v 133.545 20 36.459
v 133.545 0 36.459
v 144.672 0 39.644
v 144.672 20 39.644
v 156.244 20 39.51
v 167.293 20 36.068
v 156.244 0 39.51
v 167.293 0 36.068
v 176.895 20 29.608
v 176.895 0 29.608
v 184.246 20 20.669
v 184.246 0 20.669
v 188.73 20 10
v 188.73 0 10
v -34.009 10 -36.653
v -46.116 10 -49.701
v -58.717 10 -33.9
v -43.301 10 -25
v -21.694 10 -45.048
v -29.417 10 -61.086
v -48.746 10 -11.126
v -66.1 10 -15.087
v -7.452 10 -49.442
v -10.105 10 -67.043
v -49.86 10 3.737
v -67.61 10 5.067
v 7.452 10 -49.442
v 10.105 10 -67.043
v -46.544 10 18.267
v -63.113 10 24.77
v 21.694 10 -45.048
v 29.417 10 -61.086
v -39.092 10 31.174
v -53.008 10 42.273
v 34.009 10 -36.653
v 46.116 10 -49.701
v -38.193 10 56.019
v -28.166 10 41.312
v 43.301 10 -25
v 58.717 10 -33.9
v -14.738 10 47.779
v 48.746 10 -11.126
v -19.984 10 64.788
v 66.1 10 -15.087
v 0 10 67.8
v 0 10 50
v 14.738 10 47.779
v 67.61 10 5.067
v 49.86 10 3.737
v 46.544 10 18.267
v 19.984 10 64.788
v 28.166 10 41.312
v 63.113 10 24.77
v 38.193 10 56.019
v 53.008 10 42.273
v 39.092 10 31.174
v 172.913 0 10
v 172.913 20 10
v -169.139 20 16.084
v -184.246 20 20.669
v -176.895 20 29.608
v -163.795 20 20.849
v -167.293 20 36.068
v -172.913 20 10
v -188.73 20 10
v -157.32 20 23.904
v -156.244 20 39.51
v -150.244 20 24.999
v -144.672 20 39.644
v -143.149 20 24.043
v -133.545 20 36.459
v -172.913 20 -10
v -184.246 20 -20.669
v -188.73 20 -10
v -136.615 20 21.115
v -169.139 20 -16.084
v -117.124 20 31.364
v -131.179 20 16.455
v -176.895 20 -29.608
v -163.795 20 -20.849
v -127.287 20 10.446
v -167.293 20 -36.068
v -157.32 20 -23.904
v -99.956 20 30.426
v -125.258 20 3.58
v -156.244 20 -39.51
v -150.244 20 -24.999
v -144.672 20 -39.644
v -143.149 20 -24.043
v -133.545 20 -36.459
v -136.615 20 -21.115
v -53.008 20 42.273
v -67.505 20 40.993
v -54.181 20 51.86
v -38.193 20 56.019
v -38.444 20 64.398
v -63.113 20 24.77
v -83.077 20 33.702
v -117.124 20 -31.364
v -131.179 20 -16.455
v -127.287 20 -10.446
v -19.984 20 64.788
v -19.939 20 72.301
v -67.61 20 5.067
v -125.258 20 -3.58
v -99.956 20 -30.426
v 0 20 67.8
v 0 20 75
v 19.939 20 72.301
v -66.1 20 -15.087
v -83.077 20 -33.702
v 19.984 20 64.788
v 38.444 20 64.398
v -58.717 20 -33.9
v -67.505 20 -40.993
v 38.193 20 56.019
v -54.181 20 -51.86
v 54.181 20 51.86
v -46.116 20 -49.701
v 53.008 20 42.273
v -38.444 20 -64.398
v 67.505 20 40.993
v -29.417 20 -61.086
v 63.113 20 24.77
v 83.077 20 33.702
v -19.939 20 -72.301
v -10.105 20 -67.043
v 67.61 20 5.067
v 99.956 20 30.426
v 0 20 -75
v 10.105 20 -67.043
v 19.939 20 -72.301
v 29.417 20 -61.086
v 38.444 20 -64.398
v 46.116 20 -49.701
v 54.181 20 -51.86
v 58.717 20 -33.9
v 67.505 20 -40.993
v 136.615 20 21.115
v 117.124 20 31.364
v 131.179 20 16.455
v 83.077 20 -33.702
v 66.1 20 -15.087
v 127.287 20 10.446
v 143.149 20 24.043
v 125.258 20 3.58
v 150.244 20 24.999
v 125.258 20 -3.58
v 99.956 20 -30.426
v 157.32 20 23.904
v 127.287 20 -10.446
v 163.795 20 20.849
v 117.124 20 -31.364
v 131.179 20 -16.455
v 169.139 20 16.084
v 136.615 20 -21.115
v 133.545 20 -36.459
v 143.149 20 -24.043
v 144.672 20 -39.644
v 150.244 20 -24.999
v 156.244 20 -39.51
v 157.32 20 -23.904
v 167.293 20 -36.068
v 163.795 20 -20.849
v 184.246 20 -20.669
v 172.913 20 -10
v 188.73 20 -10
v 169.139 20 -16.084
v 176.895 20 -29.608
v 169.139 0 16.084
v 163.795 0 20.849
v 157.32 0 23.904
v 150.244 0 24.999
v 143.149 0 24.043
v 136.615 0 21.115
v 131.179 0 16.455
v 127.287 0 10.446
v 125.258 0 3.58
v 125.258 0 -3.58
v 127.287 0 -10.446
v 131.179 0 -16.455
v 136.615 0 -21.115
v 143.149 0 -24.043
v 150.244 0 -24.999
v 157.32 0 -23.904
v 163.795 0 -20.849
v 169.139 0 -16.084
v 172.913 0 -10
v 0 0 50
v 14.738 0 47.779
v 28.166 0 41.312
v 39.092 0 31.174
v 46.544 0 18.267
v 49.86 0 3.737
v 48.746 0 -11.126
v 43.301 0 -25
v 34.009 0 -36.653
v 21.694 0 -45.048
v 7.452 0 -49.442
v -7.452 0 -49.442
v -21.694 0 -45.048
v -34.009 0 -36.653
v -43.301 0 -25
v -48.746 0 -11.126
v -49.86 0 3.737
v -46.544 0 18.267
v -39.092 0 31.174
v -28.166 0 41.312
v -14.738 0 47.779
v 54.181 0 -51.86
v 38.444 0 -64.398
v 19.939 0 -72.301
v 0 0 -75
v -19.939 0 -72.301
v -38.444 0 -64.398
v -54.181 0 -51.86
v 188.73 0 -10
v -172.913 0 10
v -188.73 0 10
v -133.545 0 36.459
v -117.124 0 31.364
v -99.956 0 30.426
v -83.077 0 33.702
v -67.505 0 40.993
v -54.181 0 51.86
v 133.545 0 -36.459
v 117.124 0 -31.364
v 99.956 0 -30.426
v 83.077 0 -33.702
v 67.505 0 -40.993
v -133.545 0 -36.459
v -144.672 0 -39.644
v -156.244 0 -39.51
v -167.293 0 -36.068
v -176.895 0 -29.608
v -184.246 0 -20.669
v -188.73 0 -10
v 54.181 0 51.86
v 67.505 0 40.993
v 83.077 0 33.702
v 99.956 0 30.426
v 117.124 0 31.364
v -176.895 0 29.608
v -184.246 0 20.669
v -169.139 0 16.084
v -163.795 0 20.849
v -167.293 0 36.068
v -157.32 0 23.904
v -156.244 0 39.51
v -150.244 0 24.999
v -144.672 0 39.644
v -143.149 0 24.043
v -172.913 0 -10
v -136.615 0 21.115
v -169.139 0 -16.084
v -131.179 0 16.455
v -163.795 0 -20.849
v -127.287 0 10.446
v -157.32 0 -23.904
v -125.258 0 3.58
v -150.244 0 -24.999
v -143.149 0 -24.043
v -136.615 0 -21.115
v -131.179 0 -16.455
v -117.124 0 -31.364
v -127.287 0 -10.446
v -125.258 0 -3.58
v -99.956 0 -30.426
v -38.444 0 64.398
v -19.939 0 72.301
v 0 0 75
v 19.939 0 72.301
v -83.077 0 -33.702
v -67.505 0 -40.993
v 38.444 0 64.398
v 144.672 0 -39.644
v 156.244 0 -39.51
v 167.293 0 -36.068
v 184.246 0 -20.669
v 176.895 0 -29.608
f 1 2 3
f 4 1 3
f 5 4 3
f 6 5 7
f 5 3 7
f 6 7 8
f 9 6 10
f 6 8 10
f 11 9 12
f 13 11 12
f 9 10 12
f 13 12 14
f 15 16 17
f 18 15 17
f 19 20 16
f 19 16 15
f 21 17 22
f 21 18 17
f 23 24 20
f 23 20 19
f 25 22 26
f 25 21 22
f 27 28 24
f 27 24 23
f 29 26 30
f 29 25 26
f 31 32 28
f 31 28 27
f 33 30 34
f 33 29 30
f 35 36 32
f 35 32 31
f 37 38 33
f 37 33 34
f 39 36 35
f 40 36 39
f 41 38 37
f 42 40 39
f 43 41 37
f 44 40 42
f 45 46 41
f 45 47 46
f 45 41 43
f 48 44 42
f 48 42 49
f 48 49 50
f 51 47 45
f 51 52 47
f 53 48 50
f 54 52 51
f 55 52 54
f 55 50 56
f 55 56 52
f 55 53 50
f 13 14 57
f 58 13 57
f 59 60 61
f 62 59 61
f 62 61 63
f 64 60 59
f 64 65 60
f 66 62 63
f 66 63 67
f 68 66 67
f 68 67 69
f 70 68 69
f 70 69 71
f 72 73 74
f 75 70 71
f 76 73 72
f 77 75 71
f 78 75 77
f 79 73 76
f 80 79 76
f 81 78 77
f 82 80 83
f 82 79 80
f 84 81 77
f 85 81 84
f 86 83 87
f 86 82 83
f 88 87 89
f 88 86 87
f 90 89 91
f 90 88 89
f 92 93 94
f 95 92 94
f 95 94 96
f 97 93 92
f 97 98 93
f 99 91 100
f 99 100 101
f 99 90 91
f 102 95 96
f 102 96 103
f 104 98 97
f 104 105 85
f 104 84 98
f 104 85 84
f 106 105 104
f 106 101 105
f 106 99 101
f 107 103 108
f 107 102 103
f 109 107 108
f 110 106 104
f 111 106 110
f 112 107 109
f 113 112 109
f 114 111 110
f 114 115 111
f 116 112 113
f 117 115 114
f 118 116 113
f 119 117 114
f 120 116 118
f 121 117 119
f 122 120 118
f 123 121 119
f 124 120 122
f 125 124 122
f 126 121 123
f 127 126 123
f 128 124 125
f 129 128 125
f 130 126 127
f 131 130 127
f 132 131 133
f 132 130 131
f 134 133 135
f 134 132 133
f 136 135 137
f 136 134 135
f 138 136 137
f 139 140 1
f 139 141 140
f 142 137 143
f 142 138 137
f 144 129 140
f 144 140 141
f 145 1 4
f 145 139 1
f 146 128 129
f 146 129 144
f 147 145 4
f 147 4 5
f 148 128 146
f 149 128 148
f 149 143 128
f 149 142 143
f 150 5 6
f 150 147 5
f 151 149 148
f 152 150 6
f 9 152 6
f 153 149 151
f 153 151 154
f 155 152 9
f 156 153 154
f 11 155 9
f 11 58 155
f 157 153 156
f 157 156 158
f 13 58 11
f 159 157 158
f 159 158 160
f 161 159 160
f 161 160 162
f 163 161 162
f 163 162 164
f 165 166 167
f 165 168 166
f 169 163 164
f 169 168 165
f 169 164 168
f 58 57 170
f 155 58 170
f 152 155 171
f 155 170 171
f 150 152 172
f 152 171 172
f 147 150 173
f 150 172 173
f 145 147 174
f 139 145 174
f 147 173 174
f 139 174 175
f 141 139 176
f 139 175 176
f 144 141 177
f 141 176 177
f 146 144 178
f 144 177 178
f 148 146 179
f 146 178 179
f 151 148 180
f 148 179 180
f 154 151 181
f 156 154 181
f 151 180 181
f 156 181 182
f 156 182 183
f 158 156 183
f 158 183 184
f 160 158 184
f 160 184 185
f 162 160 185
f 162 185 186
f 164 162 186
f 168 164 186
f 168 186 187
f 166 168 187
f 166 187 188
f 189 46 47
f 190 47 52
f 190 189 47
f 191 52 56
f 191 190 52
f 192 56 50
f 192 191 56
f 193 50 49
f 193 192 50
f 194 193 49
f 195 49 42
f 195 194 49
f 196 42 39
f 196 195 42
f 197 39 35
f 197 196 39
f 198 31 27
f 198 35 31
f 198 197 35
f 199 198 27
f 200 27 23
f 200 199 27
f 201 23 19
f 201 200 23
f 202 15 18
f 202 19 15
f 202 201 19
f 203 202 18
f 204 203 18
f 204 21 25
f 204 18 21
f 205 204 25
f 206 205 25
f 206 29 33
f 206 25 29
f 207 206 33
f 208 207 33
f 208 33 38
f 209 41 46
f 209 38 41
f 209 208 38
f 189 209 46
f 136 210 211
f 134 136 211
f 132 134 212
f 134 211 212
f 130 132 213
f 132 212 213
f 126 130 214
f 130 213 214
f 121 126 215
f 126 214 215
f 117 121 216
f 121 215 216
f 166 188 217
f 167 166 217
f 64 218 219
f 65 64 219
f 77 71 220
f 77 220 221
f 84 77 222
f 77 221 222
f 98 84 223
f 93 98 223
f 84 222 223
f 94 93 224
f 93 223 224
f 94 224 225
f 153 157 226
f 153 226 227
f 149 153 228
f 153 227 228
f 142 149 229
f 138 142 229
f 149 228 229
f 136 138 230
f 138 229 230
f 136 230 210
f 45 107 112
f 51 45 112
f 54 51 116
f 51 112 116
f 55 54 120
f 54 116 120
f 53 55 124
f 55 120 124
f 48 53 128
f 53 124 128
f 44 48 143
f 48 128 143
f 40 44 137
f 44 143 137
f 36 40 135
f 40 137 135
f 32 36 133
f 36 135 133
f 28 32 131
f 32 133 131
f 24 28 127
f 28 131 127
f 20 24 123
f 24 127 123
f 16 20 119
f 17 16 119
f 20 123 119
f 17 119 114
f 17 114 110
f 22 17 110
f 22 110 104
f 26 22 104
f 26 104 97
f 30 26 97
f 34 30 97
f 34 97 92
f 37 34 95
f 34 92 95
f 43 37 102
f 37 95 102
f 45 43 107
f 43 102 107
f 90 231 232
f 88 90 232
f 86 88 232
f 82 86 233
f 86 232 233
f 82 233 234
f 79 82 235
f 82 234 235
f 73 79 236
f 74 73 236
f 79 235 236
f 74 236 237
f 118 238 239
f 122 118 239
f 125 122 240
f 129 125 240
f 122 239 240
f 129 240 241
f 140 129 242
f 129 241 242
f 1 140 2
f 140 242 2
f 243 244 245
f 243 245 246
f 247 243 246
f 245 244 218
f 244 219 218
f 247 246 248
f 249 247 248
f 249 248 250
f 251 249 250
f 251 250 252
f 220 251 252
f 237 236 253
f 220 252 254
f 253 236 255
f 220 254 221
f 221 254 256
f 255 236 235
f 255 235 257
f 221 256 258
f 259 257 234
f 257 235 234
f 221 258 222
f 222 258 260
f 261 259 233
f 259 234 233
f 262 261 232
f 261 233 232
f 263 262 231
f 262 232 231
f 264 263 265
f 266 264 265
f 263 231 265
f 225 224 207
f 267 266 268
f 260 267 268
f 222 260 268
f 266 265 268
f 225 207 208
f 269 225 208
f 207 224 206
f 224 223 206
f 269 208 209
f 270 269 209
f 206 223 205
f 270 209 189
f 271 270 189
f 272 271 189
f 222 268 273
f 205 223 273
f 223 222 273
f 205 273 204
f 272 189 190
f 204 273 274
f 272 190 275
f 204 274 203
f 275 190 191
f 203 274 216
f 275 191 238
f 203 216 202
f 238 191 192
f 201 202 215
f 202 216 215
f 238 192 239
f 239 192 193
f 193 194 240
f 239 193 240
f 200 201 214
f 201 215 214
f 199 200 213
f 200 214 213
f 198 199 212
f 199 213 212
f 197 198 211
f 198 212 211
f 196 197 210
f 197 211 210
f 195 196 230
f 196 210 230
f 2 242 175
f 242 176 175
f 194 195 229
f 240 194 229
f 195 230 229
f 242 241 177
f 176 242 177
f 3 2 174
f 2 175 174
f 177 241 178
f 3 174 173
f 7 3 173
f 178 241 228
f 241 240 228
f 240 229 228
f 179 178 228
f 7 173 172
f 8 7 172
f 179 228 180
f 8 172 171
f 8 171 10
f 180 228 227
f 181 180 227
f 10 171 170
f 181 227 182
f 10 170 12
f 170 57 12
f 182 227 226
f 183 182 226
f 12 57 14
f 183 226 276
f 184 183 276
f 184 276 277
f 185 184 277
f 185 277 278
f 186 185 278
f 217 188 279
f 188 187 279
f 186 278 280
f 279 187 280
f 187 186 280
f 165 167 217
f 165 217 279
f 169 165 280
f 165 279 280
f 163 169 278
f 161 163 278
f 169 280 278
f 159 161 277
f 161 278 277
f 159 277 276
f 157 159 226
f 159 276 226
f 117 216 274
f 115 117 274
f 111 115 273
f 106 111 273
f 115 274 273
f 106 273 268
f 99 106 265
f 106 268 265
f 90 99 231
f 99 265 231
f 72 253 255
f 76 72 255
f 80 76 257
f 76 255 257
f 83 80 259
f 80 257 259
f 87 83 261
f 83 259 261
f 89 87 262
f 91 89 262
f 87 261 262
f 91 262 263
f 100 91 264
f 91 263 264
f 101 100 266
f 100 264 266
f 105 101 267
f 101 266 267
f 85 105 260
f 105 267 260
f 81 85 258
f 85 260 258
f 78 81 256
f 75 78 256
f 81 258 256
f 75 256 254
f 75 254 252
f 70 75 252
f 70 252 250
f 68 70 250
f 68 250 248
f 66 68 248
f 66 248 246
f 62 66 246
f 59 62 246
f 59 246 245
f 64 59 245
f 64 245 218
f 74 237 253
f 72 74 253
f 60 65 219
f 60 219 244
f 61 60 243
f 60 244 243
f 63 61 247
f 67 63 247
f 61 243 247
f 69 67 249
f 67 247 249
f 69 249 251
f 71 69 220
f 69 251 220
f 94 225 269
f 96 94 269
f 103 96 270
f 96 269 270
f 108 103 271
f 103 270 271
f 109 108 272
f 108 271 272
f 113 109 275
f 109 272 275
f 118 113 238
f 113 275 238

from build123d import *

# Parameters (mm, degrees)
ESQUISSE1_R             = 50
BOSS_EXTRU_1_DEPTH      = 20
ESQUISSE2_R             = 67.8
ENL_V_MAT_EXTRU_1_DEPTH = 10


with BuildPart() as part:
    # Esquisse1 → Boss.-Extru.1 (new body)
    with BuildSketch(Plane(origin=(0, 0, 0), x_dir=(1, 0, 0), z_dir=(0, 1, 0))):
        with BuildLine():
            Line((172.912878475, 10), (188.729833462, 10))
            ThreePointArc((188.729833462, 10), (167.293491098, 36.068478837), (133.545454545, 36.458852613))
            ThreePointArc((133.545454545, 36.458852613), (91.415195679, 31.543703023), (54.181034483, 51.859574838))
            ThreePointArc((54.181034483, 51.859574838), (0, 75), (-54.181034483, 51.859574838))
            ThreePointArc((-54.181034483, 51.859574838), (-91.415195679, 31.543703023), (-133.545454545, 36.458852613))
            ThreePointArc((-133.545454545, 36.458852613), (-167.293491098, 36.068478837), (-188.729833462, 10))
            Line((-188.729833462, 10), (-172.912878475, 10))
            ThreePointArc((-172.912878475, 10), (-125, 0), (-172.912878475, -10))
            Line((-172.912878475, -10), (-188.729833462, -10))
            ThreePointArc((-188.729833462, -10), (-167.293491098, -36.068478837), (-133.545454545, -36.458852613))
            ThreePointArc((-133.545454545, -36.458852613), (-91.415195679, -31.543703023), (-54.181034483, -51.859574838))
            ThreePointArc((-54.181034483, -51.859574838), (0, -75), (54.181034483, -51.859574838))
            ThreePointArc((54.181034483, -51.859574838), (91.415195679, -31.543703023), (133.545454545, -36.458852613))
            ThreePointArc((133.545454545, -36.458852613), (167.293491098, -36.068478837), (188.729833462, -10))
            Line((188.729833462, -10), (172.912878475, -10))
            ThreePointArc((172.912878475, -10), (125, 0), (172.912878475, 10))
        make_face()
        with Locations(Location((0, 0, 0), (0, 0, 270))):
            Circle(ESQUISSE1_R, mode=Mode.SUBTRACT)
    extrude(amount=BOSS_EXTRU_1_DEPTH)

    # Esquisse2 → Enlèv. mat.-Extru.1 (cut)
    with BuildSketch(Plane(origin=(0, 20, 0), x_dir=(1, 0, 0), z_dir=(0, 1, 0))):
        with Locations(Location((0, 0, 0), (0, 0, 270))):
            Circle(ESQUISSE2_R)
    extrude(amount=-ENL_V_MAT_EXTRU_1_DEPTH, mode=Mode.SUBTRACT)


solid = part.part
